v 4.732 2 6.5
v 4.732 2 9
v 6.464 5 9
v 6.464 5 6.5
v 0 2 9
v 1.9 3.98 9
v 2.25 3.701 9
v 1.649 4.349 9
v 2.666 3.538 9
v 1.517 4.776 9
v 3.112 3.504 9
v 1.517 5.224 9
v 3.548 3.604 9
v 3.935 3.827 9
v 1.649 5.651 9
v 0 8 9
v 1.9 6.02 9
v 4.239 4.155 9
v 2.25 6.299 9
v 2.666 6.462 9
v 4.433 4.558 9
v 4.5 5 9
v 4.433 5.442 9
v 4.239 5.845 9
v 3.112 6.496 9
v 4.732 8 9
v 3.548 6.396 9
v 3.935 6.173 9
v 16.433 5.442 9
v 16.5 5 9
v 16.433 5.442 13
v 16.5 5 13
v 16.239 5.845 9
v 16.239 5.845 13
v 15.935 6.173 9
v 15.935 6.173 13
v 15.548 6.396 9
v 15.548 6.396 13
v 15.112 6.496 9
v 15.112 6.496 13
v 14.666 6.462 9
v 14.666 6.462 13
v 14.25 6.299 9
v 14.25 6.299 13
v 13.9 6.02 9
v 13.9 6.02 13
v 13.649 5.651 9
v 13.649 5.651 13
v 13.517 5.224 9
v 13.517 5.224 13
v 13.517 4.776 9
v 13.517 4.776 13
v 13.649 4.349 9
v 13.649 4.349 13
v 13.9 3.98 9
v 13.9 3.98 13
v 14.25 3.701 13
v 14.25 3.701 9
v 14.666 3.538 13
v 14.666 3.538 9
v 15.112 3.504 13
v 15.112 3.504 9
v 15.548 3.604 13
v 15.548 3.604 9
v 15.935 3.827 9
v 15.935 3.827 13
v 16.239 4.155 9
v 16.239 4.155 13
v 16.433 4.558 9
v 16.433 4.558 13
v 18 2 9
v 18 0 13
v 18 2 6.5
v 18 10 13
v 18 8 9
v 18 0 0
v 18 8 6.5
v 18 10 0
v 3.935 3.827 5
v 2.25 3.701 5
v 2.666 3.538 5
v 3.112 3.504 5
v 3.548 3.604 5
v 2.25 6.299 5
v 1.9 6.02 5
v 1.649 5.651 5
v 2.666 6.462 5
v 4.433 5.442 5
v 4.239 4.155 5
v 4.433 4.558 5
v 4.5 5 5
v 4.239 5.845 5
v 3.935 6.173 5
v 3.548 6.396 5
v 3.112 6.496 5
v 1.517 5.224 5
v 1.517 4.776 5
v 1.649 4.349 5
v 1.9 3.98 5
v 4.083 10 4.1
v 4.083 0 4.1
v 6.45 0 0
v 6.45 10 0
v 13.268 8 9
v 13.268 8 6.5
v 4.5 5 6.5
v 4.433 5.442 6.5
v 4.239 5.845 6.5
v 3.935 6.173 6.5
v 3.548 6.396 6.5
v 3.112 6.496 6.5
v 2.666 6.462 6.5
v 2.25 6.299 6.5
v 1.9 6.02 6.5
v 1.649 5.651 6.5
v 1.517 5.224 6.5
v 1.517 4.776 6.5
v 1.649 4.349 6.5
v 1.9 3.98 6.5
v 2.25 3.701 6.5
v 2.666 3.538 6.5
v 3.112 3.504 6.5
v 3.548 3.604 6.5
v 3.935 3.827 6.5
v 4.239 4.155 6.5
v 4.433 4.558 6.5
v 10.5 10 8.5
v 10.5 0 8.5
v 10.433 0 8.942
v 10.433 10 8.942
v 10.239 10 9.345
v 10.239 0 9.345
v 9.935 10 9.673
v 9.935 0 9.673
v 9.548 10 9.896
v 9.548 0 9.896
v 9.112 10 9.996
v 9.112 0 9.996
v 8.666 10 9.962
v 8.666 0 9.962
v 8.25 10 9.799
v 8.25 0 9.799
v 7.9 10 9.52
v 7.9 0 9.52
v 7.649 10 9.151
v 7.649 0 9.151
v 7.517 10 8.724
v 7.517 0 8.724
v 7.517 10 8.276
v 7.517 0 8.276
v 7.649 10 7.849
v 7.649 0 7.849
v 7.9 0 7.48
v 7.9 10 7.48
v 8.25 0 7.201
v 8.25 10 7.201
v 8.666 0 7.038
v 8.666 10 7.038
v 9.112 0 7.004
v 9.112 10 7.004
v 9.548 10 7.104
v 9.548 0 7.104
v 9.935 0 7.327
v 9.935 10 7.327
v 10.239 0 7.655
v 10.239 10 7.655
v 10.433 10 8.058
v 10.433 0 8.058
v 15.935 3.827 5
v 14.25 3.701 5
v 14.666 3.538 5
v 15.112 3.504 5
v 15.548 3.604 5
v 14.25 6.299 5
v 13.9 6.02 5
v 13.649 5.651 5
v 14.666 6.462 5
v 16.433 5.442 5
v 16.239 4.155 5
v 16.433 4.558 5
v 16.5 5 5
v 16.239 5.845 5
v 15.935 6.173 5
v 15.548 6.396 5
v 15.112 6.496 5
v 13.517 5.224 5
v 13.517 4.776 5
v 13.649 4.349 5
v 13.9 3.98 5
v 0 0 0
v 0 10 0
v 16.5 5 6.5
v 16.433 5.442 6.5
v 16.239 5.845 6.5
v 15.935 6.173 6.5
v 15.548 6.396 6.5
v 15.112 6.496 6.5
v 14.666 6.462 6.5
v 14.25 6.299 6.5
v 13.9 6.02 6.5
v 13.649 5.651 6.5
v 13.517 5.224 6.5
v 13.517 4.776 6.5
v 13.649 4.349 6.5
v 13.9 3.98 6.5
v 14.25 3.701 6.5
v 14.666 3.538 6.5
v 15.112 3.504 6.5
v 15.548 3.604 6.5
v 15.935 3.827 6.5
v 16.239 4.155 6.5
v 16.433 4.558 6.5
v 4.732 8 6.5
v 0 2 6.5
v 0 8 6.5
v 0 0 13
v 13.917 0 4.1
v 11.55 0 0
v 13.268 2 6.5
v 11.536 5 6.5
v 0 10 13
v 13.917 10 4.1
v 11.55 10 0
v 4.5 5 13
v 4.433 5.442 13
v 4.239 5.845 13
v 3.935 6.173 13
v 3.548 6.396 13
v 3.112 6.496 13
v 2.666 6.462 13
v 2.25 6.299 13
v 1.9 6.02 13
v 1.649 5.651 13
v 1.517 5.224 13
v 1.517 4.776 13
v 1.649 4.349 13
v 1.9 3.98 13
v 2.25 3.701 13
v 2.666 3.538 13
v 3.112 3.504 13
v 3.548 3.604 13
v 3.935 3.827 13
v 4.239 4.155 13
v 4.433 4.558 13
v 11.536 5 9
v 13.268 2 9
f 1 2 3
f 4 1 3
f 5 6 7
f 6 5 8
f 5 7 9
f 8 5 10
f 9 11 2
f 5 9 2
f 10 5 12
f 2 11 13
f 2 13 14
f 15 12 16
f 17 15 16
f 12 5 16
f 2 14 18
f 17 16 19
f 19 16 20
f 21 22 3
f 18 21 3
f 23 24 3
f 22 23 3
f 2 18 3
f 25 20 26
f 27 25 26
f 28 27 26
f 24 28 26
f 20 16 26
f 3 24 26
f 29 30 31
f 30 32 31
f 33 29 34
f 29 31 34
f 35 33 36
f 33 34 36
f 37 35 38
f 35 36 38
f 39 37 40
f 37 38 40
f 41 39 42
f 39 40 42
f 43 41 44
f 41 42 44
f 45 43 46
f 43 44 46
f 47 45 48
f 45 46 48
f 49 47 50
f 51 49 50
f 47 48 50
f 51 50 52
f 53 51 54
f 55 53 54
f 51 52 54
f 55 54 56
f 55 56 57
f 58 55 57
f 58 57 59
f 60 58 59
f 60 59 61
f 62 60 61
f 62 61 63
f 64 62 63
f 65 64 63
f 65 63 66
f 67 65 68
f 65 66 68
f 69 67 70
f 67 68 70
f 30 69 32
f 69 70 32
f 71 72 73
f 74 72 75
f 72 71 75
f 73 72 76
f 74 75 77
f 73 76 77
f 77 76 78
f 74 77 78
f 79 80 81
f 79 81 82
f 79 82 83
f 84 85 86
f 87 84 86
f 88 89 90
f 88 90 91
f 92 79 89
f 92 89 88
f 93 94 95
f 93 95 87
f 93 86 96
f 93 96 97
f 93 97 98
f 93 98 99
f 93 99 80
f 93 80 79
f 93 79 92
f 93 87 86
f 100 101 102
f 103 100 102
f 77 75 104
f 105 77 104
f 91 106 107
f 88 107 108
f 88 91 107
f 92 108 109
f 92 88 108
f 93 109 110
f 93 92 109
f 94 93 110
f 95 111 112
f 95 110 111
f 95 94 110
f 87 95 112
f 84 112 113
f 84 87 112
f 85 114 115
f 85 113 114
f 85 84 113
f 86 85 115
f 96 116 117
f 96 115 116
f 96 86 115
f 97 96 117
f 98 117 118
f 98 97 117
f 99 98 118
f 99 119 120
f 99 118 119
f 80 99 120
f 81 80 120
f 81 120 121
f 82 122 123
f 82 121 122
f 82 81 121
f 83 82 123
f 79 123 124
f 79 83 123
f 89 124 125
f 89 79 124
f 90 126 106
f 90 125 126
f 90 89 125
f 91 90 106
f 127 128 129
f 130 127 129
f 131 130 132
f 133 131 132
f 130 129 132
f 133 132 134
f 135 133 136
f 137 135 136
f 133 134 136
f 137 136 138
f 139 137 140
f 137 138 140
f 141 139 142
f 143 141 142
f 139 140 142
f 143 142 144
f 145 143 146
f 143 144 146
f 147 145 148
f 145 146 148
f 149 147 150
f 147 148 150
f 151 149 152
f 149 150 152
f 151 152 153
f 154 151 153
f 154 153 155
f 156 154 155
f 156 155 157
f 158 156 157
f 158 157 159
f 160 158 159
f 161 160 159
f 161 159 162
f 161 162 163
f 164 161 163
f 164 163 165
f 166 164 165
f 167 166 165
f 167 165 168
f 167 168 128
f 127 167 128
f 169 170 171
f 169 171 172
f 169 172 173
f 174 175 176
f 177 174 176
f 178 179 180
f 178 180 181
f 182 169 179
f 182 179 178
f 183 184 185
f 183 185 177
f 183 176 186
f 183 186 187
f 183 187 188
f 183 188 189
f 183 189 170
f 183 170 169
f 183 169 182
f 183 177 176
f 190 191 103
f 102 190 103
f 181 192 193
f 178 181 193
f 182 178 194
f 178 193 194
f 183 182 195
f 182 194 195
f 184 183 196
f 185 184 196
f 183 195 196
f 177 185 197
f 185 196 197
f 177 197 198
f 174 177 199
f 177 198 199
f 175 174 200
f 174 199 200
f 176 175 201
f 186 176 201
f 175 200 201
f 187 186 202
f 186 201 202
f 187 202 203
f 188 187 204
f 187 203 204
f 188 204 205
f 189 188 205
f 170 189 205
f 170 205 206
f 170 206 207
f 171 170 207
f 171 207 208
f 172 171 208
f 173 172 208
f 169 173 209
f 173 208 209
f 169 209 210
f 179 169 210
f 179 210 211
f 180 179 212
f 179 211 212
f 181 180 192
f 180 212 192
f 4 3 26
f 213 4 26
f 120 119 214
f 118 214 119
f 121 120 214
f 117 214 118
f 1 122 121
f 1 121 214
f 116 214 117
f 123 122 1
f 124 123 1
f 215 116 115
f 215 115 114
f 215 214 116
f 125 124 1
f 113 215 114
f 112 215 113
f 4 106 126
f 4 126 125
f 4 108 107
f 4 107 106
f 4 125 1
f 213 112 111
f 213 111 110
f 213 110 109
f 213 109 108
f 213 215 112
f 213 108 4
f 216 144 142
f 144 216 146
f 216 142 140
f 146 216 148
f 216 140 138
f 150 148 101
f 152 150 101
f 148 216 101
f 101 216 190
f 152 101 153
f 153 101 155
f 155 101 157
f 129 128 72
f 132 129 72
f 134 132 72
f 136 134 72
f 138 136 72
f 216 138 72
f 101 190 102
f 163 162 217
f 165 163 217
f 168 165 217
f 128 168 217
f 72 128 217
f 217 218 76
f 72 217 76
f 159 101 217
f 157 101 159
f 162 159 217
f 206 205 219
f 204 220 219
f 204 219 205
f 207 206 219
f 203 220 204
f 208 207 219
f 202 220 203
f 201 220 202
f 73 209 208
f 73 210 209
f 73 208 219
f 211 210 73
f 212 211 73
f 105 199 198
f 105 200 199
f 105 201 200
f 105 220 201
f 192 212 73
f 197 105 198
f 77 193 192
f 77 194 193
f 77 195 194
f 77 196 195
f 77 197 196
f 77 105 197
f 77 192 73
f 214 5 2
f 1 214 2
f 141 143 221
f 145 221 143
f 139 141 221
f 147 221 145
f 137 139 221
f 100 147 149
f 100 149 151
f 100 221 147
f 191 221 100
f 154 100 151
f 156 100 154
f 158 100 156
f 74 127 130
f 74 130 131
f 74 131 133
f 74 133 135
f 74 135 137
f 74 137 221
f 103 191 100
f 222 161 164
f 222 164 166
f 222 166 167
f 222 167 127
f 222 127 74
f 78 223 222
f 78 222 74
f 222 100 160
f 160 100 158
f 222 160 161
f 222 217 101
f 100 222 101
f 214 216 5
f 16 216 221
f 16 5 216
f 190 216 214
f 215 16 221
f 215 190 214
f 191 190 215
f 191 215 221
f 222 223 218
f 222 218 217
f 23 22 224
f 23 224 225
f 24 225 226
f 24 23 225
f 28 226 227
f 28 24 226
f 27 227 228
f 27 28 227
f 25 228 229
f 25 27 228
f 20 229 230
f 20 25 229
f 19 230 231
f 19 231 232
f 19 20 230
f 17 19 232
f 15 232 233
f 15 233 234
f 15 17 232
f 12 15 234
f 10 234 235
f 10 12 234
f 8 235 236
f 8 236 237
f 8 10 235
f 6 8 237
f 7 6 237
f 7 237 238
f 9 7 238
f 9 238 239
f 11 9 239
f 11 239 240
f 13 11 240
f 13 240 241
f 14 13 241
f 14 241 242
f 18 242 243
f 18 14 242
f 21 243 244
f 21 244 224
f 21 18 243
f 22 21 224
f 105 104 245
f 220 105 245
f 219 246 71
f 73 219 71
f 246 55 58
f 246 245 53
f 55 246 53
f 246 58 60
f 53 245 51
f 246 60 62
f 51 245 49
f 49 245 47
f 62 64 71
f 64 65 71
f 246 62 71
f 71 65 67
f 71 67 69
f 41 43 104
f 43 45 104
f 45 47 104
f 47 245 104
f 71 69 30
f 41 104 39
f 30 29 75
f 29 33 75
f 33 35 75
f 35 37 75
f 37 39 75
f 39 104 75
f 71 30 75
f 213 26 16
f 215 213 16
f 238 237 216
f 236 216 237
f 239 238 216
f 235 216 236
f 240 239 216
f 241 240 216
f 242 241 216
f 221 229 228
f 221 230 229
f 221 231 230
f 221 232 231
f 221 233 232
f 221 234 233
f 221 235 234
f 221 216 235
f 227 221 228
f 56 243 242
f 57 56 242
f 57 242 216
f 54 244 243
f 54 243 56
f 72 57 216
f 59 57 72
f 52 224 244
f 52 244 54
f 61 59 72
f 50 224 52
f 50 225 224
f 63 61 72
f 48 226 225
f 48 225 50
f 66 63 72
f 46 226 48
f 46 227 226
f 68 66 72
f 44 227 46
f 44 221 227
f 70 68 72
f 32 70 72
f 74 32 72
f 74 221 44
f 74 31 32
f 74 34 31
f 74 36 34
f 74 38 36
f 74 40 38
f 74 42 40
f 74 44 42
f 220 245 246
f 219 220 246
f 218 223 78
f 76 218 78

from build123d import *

# Parameters (mm, degrees)
SKETCH_W        = 18
SKETCH_H        = 10
PAD_DEPTH       = 13
SKETCH009_R     = 1.5
POCKET_DEPTH    = 4
POCKET001_DEPTH = 2.5
POCKET002_DEPTH = 10.001
SKETCH012_R     = 1.5
POCKET003_DEPTH = 10.001


with BuildPart() as part:
    # Sketch → Pad (new body)
    with BuildSketch(Plane.XY):
        with Locations((9, 5)):
            Rectangle(SKETCH_W, SKETCH_H)
    extrude(amount=PAD_DEPTH)

    # Sketch009 (on DatumPlane) → Pocket (cut, symmetric)
    with BuildSketch(Plane.XY.offset(9)):
        with Locations((3, 5)):
            Circle(SKETCH009_R)
        with Locations((15, 5)):
            Circle(SKETCH009_R)
    extrude(amount=POCKET_DEPTH, both=True, mode=Mode.SUBTRACT)

    # Sketch010 (on DatumPlane) → Pocket001 (cut)
    with BuildSketch(Plane.XY.offset(9)):
        Polygon((4.732051, 2), (6.464102, 5), (4.732051, 8), (1.267949, 8), (0, 8), (0, 2), (1.267949, 2), align=None)
        Polygon((16.732051, 8), (13.267949, 8), (11.535898, 5), (13.267949, 2), (16.732051, 2), (18, 2), (18, 8), align=None)
    extrude(amount=-POCKET001_DEPTH, mode=Mode.SUBTRACT)

    # Sketch011 → Pocket002 (cut, through all)
    with BuildSketch(Plane.XZ):
        Polygon((6.45, 0), (11.55, 0), (13.917136, 4.1), (4.082864, 4.1), align=None)
    extrude(amount=-POCKET002_DEPTH, mode=Mode.SUBTRACT)

    # Sketch012 → Pocket003 (cut, through all)
    with BuildSketch(Plane.XZ):
        with Locations((9, 8.5)):
            Circle(SKETCH012_R)
    extrude(amount=-POCKET003_DEPTH, mode=Mode.SUBTRACT)


solid = part.part
